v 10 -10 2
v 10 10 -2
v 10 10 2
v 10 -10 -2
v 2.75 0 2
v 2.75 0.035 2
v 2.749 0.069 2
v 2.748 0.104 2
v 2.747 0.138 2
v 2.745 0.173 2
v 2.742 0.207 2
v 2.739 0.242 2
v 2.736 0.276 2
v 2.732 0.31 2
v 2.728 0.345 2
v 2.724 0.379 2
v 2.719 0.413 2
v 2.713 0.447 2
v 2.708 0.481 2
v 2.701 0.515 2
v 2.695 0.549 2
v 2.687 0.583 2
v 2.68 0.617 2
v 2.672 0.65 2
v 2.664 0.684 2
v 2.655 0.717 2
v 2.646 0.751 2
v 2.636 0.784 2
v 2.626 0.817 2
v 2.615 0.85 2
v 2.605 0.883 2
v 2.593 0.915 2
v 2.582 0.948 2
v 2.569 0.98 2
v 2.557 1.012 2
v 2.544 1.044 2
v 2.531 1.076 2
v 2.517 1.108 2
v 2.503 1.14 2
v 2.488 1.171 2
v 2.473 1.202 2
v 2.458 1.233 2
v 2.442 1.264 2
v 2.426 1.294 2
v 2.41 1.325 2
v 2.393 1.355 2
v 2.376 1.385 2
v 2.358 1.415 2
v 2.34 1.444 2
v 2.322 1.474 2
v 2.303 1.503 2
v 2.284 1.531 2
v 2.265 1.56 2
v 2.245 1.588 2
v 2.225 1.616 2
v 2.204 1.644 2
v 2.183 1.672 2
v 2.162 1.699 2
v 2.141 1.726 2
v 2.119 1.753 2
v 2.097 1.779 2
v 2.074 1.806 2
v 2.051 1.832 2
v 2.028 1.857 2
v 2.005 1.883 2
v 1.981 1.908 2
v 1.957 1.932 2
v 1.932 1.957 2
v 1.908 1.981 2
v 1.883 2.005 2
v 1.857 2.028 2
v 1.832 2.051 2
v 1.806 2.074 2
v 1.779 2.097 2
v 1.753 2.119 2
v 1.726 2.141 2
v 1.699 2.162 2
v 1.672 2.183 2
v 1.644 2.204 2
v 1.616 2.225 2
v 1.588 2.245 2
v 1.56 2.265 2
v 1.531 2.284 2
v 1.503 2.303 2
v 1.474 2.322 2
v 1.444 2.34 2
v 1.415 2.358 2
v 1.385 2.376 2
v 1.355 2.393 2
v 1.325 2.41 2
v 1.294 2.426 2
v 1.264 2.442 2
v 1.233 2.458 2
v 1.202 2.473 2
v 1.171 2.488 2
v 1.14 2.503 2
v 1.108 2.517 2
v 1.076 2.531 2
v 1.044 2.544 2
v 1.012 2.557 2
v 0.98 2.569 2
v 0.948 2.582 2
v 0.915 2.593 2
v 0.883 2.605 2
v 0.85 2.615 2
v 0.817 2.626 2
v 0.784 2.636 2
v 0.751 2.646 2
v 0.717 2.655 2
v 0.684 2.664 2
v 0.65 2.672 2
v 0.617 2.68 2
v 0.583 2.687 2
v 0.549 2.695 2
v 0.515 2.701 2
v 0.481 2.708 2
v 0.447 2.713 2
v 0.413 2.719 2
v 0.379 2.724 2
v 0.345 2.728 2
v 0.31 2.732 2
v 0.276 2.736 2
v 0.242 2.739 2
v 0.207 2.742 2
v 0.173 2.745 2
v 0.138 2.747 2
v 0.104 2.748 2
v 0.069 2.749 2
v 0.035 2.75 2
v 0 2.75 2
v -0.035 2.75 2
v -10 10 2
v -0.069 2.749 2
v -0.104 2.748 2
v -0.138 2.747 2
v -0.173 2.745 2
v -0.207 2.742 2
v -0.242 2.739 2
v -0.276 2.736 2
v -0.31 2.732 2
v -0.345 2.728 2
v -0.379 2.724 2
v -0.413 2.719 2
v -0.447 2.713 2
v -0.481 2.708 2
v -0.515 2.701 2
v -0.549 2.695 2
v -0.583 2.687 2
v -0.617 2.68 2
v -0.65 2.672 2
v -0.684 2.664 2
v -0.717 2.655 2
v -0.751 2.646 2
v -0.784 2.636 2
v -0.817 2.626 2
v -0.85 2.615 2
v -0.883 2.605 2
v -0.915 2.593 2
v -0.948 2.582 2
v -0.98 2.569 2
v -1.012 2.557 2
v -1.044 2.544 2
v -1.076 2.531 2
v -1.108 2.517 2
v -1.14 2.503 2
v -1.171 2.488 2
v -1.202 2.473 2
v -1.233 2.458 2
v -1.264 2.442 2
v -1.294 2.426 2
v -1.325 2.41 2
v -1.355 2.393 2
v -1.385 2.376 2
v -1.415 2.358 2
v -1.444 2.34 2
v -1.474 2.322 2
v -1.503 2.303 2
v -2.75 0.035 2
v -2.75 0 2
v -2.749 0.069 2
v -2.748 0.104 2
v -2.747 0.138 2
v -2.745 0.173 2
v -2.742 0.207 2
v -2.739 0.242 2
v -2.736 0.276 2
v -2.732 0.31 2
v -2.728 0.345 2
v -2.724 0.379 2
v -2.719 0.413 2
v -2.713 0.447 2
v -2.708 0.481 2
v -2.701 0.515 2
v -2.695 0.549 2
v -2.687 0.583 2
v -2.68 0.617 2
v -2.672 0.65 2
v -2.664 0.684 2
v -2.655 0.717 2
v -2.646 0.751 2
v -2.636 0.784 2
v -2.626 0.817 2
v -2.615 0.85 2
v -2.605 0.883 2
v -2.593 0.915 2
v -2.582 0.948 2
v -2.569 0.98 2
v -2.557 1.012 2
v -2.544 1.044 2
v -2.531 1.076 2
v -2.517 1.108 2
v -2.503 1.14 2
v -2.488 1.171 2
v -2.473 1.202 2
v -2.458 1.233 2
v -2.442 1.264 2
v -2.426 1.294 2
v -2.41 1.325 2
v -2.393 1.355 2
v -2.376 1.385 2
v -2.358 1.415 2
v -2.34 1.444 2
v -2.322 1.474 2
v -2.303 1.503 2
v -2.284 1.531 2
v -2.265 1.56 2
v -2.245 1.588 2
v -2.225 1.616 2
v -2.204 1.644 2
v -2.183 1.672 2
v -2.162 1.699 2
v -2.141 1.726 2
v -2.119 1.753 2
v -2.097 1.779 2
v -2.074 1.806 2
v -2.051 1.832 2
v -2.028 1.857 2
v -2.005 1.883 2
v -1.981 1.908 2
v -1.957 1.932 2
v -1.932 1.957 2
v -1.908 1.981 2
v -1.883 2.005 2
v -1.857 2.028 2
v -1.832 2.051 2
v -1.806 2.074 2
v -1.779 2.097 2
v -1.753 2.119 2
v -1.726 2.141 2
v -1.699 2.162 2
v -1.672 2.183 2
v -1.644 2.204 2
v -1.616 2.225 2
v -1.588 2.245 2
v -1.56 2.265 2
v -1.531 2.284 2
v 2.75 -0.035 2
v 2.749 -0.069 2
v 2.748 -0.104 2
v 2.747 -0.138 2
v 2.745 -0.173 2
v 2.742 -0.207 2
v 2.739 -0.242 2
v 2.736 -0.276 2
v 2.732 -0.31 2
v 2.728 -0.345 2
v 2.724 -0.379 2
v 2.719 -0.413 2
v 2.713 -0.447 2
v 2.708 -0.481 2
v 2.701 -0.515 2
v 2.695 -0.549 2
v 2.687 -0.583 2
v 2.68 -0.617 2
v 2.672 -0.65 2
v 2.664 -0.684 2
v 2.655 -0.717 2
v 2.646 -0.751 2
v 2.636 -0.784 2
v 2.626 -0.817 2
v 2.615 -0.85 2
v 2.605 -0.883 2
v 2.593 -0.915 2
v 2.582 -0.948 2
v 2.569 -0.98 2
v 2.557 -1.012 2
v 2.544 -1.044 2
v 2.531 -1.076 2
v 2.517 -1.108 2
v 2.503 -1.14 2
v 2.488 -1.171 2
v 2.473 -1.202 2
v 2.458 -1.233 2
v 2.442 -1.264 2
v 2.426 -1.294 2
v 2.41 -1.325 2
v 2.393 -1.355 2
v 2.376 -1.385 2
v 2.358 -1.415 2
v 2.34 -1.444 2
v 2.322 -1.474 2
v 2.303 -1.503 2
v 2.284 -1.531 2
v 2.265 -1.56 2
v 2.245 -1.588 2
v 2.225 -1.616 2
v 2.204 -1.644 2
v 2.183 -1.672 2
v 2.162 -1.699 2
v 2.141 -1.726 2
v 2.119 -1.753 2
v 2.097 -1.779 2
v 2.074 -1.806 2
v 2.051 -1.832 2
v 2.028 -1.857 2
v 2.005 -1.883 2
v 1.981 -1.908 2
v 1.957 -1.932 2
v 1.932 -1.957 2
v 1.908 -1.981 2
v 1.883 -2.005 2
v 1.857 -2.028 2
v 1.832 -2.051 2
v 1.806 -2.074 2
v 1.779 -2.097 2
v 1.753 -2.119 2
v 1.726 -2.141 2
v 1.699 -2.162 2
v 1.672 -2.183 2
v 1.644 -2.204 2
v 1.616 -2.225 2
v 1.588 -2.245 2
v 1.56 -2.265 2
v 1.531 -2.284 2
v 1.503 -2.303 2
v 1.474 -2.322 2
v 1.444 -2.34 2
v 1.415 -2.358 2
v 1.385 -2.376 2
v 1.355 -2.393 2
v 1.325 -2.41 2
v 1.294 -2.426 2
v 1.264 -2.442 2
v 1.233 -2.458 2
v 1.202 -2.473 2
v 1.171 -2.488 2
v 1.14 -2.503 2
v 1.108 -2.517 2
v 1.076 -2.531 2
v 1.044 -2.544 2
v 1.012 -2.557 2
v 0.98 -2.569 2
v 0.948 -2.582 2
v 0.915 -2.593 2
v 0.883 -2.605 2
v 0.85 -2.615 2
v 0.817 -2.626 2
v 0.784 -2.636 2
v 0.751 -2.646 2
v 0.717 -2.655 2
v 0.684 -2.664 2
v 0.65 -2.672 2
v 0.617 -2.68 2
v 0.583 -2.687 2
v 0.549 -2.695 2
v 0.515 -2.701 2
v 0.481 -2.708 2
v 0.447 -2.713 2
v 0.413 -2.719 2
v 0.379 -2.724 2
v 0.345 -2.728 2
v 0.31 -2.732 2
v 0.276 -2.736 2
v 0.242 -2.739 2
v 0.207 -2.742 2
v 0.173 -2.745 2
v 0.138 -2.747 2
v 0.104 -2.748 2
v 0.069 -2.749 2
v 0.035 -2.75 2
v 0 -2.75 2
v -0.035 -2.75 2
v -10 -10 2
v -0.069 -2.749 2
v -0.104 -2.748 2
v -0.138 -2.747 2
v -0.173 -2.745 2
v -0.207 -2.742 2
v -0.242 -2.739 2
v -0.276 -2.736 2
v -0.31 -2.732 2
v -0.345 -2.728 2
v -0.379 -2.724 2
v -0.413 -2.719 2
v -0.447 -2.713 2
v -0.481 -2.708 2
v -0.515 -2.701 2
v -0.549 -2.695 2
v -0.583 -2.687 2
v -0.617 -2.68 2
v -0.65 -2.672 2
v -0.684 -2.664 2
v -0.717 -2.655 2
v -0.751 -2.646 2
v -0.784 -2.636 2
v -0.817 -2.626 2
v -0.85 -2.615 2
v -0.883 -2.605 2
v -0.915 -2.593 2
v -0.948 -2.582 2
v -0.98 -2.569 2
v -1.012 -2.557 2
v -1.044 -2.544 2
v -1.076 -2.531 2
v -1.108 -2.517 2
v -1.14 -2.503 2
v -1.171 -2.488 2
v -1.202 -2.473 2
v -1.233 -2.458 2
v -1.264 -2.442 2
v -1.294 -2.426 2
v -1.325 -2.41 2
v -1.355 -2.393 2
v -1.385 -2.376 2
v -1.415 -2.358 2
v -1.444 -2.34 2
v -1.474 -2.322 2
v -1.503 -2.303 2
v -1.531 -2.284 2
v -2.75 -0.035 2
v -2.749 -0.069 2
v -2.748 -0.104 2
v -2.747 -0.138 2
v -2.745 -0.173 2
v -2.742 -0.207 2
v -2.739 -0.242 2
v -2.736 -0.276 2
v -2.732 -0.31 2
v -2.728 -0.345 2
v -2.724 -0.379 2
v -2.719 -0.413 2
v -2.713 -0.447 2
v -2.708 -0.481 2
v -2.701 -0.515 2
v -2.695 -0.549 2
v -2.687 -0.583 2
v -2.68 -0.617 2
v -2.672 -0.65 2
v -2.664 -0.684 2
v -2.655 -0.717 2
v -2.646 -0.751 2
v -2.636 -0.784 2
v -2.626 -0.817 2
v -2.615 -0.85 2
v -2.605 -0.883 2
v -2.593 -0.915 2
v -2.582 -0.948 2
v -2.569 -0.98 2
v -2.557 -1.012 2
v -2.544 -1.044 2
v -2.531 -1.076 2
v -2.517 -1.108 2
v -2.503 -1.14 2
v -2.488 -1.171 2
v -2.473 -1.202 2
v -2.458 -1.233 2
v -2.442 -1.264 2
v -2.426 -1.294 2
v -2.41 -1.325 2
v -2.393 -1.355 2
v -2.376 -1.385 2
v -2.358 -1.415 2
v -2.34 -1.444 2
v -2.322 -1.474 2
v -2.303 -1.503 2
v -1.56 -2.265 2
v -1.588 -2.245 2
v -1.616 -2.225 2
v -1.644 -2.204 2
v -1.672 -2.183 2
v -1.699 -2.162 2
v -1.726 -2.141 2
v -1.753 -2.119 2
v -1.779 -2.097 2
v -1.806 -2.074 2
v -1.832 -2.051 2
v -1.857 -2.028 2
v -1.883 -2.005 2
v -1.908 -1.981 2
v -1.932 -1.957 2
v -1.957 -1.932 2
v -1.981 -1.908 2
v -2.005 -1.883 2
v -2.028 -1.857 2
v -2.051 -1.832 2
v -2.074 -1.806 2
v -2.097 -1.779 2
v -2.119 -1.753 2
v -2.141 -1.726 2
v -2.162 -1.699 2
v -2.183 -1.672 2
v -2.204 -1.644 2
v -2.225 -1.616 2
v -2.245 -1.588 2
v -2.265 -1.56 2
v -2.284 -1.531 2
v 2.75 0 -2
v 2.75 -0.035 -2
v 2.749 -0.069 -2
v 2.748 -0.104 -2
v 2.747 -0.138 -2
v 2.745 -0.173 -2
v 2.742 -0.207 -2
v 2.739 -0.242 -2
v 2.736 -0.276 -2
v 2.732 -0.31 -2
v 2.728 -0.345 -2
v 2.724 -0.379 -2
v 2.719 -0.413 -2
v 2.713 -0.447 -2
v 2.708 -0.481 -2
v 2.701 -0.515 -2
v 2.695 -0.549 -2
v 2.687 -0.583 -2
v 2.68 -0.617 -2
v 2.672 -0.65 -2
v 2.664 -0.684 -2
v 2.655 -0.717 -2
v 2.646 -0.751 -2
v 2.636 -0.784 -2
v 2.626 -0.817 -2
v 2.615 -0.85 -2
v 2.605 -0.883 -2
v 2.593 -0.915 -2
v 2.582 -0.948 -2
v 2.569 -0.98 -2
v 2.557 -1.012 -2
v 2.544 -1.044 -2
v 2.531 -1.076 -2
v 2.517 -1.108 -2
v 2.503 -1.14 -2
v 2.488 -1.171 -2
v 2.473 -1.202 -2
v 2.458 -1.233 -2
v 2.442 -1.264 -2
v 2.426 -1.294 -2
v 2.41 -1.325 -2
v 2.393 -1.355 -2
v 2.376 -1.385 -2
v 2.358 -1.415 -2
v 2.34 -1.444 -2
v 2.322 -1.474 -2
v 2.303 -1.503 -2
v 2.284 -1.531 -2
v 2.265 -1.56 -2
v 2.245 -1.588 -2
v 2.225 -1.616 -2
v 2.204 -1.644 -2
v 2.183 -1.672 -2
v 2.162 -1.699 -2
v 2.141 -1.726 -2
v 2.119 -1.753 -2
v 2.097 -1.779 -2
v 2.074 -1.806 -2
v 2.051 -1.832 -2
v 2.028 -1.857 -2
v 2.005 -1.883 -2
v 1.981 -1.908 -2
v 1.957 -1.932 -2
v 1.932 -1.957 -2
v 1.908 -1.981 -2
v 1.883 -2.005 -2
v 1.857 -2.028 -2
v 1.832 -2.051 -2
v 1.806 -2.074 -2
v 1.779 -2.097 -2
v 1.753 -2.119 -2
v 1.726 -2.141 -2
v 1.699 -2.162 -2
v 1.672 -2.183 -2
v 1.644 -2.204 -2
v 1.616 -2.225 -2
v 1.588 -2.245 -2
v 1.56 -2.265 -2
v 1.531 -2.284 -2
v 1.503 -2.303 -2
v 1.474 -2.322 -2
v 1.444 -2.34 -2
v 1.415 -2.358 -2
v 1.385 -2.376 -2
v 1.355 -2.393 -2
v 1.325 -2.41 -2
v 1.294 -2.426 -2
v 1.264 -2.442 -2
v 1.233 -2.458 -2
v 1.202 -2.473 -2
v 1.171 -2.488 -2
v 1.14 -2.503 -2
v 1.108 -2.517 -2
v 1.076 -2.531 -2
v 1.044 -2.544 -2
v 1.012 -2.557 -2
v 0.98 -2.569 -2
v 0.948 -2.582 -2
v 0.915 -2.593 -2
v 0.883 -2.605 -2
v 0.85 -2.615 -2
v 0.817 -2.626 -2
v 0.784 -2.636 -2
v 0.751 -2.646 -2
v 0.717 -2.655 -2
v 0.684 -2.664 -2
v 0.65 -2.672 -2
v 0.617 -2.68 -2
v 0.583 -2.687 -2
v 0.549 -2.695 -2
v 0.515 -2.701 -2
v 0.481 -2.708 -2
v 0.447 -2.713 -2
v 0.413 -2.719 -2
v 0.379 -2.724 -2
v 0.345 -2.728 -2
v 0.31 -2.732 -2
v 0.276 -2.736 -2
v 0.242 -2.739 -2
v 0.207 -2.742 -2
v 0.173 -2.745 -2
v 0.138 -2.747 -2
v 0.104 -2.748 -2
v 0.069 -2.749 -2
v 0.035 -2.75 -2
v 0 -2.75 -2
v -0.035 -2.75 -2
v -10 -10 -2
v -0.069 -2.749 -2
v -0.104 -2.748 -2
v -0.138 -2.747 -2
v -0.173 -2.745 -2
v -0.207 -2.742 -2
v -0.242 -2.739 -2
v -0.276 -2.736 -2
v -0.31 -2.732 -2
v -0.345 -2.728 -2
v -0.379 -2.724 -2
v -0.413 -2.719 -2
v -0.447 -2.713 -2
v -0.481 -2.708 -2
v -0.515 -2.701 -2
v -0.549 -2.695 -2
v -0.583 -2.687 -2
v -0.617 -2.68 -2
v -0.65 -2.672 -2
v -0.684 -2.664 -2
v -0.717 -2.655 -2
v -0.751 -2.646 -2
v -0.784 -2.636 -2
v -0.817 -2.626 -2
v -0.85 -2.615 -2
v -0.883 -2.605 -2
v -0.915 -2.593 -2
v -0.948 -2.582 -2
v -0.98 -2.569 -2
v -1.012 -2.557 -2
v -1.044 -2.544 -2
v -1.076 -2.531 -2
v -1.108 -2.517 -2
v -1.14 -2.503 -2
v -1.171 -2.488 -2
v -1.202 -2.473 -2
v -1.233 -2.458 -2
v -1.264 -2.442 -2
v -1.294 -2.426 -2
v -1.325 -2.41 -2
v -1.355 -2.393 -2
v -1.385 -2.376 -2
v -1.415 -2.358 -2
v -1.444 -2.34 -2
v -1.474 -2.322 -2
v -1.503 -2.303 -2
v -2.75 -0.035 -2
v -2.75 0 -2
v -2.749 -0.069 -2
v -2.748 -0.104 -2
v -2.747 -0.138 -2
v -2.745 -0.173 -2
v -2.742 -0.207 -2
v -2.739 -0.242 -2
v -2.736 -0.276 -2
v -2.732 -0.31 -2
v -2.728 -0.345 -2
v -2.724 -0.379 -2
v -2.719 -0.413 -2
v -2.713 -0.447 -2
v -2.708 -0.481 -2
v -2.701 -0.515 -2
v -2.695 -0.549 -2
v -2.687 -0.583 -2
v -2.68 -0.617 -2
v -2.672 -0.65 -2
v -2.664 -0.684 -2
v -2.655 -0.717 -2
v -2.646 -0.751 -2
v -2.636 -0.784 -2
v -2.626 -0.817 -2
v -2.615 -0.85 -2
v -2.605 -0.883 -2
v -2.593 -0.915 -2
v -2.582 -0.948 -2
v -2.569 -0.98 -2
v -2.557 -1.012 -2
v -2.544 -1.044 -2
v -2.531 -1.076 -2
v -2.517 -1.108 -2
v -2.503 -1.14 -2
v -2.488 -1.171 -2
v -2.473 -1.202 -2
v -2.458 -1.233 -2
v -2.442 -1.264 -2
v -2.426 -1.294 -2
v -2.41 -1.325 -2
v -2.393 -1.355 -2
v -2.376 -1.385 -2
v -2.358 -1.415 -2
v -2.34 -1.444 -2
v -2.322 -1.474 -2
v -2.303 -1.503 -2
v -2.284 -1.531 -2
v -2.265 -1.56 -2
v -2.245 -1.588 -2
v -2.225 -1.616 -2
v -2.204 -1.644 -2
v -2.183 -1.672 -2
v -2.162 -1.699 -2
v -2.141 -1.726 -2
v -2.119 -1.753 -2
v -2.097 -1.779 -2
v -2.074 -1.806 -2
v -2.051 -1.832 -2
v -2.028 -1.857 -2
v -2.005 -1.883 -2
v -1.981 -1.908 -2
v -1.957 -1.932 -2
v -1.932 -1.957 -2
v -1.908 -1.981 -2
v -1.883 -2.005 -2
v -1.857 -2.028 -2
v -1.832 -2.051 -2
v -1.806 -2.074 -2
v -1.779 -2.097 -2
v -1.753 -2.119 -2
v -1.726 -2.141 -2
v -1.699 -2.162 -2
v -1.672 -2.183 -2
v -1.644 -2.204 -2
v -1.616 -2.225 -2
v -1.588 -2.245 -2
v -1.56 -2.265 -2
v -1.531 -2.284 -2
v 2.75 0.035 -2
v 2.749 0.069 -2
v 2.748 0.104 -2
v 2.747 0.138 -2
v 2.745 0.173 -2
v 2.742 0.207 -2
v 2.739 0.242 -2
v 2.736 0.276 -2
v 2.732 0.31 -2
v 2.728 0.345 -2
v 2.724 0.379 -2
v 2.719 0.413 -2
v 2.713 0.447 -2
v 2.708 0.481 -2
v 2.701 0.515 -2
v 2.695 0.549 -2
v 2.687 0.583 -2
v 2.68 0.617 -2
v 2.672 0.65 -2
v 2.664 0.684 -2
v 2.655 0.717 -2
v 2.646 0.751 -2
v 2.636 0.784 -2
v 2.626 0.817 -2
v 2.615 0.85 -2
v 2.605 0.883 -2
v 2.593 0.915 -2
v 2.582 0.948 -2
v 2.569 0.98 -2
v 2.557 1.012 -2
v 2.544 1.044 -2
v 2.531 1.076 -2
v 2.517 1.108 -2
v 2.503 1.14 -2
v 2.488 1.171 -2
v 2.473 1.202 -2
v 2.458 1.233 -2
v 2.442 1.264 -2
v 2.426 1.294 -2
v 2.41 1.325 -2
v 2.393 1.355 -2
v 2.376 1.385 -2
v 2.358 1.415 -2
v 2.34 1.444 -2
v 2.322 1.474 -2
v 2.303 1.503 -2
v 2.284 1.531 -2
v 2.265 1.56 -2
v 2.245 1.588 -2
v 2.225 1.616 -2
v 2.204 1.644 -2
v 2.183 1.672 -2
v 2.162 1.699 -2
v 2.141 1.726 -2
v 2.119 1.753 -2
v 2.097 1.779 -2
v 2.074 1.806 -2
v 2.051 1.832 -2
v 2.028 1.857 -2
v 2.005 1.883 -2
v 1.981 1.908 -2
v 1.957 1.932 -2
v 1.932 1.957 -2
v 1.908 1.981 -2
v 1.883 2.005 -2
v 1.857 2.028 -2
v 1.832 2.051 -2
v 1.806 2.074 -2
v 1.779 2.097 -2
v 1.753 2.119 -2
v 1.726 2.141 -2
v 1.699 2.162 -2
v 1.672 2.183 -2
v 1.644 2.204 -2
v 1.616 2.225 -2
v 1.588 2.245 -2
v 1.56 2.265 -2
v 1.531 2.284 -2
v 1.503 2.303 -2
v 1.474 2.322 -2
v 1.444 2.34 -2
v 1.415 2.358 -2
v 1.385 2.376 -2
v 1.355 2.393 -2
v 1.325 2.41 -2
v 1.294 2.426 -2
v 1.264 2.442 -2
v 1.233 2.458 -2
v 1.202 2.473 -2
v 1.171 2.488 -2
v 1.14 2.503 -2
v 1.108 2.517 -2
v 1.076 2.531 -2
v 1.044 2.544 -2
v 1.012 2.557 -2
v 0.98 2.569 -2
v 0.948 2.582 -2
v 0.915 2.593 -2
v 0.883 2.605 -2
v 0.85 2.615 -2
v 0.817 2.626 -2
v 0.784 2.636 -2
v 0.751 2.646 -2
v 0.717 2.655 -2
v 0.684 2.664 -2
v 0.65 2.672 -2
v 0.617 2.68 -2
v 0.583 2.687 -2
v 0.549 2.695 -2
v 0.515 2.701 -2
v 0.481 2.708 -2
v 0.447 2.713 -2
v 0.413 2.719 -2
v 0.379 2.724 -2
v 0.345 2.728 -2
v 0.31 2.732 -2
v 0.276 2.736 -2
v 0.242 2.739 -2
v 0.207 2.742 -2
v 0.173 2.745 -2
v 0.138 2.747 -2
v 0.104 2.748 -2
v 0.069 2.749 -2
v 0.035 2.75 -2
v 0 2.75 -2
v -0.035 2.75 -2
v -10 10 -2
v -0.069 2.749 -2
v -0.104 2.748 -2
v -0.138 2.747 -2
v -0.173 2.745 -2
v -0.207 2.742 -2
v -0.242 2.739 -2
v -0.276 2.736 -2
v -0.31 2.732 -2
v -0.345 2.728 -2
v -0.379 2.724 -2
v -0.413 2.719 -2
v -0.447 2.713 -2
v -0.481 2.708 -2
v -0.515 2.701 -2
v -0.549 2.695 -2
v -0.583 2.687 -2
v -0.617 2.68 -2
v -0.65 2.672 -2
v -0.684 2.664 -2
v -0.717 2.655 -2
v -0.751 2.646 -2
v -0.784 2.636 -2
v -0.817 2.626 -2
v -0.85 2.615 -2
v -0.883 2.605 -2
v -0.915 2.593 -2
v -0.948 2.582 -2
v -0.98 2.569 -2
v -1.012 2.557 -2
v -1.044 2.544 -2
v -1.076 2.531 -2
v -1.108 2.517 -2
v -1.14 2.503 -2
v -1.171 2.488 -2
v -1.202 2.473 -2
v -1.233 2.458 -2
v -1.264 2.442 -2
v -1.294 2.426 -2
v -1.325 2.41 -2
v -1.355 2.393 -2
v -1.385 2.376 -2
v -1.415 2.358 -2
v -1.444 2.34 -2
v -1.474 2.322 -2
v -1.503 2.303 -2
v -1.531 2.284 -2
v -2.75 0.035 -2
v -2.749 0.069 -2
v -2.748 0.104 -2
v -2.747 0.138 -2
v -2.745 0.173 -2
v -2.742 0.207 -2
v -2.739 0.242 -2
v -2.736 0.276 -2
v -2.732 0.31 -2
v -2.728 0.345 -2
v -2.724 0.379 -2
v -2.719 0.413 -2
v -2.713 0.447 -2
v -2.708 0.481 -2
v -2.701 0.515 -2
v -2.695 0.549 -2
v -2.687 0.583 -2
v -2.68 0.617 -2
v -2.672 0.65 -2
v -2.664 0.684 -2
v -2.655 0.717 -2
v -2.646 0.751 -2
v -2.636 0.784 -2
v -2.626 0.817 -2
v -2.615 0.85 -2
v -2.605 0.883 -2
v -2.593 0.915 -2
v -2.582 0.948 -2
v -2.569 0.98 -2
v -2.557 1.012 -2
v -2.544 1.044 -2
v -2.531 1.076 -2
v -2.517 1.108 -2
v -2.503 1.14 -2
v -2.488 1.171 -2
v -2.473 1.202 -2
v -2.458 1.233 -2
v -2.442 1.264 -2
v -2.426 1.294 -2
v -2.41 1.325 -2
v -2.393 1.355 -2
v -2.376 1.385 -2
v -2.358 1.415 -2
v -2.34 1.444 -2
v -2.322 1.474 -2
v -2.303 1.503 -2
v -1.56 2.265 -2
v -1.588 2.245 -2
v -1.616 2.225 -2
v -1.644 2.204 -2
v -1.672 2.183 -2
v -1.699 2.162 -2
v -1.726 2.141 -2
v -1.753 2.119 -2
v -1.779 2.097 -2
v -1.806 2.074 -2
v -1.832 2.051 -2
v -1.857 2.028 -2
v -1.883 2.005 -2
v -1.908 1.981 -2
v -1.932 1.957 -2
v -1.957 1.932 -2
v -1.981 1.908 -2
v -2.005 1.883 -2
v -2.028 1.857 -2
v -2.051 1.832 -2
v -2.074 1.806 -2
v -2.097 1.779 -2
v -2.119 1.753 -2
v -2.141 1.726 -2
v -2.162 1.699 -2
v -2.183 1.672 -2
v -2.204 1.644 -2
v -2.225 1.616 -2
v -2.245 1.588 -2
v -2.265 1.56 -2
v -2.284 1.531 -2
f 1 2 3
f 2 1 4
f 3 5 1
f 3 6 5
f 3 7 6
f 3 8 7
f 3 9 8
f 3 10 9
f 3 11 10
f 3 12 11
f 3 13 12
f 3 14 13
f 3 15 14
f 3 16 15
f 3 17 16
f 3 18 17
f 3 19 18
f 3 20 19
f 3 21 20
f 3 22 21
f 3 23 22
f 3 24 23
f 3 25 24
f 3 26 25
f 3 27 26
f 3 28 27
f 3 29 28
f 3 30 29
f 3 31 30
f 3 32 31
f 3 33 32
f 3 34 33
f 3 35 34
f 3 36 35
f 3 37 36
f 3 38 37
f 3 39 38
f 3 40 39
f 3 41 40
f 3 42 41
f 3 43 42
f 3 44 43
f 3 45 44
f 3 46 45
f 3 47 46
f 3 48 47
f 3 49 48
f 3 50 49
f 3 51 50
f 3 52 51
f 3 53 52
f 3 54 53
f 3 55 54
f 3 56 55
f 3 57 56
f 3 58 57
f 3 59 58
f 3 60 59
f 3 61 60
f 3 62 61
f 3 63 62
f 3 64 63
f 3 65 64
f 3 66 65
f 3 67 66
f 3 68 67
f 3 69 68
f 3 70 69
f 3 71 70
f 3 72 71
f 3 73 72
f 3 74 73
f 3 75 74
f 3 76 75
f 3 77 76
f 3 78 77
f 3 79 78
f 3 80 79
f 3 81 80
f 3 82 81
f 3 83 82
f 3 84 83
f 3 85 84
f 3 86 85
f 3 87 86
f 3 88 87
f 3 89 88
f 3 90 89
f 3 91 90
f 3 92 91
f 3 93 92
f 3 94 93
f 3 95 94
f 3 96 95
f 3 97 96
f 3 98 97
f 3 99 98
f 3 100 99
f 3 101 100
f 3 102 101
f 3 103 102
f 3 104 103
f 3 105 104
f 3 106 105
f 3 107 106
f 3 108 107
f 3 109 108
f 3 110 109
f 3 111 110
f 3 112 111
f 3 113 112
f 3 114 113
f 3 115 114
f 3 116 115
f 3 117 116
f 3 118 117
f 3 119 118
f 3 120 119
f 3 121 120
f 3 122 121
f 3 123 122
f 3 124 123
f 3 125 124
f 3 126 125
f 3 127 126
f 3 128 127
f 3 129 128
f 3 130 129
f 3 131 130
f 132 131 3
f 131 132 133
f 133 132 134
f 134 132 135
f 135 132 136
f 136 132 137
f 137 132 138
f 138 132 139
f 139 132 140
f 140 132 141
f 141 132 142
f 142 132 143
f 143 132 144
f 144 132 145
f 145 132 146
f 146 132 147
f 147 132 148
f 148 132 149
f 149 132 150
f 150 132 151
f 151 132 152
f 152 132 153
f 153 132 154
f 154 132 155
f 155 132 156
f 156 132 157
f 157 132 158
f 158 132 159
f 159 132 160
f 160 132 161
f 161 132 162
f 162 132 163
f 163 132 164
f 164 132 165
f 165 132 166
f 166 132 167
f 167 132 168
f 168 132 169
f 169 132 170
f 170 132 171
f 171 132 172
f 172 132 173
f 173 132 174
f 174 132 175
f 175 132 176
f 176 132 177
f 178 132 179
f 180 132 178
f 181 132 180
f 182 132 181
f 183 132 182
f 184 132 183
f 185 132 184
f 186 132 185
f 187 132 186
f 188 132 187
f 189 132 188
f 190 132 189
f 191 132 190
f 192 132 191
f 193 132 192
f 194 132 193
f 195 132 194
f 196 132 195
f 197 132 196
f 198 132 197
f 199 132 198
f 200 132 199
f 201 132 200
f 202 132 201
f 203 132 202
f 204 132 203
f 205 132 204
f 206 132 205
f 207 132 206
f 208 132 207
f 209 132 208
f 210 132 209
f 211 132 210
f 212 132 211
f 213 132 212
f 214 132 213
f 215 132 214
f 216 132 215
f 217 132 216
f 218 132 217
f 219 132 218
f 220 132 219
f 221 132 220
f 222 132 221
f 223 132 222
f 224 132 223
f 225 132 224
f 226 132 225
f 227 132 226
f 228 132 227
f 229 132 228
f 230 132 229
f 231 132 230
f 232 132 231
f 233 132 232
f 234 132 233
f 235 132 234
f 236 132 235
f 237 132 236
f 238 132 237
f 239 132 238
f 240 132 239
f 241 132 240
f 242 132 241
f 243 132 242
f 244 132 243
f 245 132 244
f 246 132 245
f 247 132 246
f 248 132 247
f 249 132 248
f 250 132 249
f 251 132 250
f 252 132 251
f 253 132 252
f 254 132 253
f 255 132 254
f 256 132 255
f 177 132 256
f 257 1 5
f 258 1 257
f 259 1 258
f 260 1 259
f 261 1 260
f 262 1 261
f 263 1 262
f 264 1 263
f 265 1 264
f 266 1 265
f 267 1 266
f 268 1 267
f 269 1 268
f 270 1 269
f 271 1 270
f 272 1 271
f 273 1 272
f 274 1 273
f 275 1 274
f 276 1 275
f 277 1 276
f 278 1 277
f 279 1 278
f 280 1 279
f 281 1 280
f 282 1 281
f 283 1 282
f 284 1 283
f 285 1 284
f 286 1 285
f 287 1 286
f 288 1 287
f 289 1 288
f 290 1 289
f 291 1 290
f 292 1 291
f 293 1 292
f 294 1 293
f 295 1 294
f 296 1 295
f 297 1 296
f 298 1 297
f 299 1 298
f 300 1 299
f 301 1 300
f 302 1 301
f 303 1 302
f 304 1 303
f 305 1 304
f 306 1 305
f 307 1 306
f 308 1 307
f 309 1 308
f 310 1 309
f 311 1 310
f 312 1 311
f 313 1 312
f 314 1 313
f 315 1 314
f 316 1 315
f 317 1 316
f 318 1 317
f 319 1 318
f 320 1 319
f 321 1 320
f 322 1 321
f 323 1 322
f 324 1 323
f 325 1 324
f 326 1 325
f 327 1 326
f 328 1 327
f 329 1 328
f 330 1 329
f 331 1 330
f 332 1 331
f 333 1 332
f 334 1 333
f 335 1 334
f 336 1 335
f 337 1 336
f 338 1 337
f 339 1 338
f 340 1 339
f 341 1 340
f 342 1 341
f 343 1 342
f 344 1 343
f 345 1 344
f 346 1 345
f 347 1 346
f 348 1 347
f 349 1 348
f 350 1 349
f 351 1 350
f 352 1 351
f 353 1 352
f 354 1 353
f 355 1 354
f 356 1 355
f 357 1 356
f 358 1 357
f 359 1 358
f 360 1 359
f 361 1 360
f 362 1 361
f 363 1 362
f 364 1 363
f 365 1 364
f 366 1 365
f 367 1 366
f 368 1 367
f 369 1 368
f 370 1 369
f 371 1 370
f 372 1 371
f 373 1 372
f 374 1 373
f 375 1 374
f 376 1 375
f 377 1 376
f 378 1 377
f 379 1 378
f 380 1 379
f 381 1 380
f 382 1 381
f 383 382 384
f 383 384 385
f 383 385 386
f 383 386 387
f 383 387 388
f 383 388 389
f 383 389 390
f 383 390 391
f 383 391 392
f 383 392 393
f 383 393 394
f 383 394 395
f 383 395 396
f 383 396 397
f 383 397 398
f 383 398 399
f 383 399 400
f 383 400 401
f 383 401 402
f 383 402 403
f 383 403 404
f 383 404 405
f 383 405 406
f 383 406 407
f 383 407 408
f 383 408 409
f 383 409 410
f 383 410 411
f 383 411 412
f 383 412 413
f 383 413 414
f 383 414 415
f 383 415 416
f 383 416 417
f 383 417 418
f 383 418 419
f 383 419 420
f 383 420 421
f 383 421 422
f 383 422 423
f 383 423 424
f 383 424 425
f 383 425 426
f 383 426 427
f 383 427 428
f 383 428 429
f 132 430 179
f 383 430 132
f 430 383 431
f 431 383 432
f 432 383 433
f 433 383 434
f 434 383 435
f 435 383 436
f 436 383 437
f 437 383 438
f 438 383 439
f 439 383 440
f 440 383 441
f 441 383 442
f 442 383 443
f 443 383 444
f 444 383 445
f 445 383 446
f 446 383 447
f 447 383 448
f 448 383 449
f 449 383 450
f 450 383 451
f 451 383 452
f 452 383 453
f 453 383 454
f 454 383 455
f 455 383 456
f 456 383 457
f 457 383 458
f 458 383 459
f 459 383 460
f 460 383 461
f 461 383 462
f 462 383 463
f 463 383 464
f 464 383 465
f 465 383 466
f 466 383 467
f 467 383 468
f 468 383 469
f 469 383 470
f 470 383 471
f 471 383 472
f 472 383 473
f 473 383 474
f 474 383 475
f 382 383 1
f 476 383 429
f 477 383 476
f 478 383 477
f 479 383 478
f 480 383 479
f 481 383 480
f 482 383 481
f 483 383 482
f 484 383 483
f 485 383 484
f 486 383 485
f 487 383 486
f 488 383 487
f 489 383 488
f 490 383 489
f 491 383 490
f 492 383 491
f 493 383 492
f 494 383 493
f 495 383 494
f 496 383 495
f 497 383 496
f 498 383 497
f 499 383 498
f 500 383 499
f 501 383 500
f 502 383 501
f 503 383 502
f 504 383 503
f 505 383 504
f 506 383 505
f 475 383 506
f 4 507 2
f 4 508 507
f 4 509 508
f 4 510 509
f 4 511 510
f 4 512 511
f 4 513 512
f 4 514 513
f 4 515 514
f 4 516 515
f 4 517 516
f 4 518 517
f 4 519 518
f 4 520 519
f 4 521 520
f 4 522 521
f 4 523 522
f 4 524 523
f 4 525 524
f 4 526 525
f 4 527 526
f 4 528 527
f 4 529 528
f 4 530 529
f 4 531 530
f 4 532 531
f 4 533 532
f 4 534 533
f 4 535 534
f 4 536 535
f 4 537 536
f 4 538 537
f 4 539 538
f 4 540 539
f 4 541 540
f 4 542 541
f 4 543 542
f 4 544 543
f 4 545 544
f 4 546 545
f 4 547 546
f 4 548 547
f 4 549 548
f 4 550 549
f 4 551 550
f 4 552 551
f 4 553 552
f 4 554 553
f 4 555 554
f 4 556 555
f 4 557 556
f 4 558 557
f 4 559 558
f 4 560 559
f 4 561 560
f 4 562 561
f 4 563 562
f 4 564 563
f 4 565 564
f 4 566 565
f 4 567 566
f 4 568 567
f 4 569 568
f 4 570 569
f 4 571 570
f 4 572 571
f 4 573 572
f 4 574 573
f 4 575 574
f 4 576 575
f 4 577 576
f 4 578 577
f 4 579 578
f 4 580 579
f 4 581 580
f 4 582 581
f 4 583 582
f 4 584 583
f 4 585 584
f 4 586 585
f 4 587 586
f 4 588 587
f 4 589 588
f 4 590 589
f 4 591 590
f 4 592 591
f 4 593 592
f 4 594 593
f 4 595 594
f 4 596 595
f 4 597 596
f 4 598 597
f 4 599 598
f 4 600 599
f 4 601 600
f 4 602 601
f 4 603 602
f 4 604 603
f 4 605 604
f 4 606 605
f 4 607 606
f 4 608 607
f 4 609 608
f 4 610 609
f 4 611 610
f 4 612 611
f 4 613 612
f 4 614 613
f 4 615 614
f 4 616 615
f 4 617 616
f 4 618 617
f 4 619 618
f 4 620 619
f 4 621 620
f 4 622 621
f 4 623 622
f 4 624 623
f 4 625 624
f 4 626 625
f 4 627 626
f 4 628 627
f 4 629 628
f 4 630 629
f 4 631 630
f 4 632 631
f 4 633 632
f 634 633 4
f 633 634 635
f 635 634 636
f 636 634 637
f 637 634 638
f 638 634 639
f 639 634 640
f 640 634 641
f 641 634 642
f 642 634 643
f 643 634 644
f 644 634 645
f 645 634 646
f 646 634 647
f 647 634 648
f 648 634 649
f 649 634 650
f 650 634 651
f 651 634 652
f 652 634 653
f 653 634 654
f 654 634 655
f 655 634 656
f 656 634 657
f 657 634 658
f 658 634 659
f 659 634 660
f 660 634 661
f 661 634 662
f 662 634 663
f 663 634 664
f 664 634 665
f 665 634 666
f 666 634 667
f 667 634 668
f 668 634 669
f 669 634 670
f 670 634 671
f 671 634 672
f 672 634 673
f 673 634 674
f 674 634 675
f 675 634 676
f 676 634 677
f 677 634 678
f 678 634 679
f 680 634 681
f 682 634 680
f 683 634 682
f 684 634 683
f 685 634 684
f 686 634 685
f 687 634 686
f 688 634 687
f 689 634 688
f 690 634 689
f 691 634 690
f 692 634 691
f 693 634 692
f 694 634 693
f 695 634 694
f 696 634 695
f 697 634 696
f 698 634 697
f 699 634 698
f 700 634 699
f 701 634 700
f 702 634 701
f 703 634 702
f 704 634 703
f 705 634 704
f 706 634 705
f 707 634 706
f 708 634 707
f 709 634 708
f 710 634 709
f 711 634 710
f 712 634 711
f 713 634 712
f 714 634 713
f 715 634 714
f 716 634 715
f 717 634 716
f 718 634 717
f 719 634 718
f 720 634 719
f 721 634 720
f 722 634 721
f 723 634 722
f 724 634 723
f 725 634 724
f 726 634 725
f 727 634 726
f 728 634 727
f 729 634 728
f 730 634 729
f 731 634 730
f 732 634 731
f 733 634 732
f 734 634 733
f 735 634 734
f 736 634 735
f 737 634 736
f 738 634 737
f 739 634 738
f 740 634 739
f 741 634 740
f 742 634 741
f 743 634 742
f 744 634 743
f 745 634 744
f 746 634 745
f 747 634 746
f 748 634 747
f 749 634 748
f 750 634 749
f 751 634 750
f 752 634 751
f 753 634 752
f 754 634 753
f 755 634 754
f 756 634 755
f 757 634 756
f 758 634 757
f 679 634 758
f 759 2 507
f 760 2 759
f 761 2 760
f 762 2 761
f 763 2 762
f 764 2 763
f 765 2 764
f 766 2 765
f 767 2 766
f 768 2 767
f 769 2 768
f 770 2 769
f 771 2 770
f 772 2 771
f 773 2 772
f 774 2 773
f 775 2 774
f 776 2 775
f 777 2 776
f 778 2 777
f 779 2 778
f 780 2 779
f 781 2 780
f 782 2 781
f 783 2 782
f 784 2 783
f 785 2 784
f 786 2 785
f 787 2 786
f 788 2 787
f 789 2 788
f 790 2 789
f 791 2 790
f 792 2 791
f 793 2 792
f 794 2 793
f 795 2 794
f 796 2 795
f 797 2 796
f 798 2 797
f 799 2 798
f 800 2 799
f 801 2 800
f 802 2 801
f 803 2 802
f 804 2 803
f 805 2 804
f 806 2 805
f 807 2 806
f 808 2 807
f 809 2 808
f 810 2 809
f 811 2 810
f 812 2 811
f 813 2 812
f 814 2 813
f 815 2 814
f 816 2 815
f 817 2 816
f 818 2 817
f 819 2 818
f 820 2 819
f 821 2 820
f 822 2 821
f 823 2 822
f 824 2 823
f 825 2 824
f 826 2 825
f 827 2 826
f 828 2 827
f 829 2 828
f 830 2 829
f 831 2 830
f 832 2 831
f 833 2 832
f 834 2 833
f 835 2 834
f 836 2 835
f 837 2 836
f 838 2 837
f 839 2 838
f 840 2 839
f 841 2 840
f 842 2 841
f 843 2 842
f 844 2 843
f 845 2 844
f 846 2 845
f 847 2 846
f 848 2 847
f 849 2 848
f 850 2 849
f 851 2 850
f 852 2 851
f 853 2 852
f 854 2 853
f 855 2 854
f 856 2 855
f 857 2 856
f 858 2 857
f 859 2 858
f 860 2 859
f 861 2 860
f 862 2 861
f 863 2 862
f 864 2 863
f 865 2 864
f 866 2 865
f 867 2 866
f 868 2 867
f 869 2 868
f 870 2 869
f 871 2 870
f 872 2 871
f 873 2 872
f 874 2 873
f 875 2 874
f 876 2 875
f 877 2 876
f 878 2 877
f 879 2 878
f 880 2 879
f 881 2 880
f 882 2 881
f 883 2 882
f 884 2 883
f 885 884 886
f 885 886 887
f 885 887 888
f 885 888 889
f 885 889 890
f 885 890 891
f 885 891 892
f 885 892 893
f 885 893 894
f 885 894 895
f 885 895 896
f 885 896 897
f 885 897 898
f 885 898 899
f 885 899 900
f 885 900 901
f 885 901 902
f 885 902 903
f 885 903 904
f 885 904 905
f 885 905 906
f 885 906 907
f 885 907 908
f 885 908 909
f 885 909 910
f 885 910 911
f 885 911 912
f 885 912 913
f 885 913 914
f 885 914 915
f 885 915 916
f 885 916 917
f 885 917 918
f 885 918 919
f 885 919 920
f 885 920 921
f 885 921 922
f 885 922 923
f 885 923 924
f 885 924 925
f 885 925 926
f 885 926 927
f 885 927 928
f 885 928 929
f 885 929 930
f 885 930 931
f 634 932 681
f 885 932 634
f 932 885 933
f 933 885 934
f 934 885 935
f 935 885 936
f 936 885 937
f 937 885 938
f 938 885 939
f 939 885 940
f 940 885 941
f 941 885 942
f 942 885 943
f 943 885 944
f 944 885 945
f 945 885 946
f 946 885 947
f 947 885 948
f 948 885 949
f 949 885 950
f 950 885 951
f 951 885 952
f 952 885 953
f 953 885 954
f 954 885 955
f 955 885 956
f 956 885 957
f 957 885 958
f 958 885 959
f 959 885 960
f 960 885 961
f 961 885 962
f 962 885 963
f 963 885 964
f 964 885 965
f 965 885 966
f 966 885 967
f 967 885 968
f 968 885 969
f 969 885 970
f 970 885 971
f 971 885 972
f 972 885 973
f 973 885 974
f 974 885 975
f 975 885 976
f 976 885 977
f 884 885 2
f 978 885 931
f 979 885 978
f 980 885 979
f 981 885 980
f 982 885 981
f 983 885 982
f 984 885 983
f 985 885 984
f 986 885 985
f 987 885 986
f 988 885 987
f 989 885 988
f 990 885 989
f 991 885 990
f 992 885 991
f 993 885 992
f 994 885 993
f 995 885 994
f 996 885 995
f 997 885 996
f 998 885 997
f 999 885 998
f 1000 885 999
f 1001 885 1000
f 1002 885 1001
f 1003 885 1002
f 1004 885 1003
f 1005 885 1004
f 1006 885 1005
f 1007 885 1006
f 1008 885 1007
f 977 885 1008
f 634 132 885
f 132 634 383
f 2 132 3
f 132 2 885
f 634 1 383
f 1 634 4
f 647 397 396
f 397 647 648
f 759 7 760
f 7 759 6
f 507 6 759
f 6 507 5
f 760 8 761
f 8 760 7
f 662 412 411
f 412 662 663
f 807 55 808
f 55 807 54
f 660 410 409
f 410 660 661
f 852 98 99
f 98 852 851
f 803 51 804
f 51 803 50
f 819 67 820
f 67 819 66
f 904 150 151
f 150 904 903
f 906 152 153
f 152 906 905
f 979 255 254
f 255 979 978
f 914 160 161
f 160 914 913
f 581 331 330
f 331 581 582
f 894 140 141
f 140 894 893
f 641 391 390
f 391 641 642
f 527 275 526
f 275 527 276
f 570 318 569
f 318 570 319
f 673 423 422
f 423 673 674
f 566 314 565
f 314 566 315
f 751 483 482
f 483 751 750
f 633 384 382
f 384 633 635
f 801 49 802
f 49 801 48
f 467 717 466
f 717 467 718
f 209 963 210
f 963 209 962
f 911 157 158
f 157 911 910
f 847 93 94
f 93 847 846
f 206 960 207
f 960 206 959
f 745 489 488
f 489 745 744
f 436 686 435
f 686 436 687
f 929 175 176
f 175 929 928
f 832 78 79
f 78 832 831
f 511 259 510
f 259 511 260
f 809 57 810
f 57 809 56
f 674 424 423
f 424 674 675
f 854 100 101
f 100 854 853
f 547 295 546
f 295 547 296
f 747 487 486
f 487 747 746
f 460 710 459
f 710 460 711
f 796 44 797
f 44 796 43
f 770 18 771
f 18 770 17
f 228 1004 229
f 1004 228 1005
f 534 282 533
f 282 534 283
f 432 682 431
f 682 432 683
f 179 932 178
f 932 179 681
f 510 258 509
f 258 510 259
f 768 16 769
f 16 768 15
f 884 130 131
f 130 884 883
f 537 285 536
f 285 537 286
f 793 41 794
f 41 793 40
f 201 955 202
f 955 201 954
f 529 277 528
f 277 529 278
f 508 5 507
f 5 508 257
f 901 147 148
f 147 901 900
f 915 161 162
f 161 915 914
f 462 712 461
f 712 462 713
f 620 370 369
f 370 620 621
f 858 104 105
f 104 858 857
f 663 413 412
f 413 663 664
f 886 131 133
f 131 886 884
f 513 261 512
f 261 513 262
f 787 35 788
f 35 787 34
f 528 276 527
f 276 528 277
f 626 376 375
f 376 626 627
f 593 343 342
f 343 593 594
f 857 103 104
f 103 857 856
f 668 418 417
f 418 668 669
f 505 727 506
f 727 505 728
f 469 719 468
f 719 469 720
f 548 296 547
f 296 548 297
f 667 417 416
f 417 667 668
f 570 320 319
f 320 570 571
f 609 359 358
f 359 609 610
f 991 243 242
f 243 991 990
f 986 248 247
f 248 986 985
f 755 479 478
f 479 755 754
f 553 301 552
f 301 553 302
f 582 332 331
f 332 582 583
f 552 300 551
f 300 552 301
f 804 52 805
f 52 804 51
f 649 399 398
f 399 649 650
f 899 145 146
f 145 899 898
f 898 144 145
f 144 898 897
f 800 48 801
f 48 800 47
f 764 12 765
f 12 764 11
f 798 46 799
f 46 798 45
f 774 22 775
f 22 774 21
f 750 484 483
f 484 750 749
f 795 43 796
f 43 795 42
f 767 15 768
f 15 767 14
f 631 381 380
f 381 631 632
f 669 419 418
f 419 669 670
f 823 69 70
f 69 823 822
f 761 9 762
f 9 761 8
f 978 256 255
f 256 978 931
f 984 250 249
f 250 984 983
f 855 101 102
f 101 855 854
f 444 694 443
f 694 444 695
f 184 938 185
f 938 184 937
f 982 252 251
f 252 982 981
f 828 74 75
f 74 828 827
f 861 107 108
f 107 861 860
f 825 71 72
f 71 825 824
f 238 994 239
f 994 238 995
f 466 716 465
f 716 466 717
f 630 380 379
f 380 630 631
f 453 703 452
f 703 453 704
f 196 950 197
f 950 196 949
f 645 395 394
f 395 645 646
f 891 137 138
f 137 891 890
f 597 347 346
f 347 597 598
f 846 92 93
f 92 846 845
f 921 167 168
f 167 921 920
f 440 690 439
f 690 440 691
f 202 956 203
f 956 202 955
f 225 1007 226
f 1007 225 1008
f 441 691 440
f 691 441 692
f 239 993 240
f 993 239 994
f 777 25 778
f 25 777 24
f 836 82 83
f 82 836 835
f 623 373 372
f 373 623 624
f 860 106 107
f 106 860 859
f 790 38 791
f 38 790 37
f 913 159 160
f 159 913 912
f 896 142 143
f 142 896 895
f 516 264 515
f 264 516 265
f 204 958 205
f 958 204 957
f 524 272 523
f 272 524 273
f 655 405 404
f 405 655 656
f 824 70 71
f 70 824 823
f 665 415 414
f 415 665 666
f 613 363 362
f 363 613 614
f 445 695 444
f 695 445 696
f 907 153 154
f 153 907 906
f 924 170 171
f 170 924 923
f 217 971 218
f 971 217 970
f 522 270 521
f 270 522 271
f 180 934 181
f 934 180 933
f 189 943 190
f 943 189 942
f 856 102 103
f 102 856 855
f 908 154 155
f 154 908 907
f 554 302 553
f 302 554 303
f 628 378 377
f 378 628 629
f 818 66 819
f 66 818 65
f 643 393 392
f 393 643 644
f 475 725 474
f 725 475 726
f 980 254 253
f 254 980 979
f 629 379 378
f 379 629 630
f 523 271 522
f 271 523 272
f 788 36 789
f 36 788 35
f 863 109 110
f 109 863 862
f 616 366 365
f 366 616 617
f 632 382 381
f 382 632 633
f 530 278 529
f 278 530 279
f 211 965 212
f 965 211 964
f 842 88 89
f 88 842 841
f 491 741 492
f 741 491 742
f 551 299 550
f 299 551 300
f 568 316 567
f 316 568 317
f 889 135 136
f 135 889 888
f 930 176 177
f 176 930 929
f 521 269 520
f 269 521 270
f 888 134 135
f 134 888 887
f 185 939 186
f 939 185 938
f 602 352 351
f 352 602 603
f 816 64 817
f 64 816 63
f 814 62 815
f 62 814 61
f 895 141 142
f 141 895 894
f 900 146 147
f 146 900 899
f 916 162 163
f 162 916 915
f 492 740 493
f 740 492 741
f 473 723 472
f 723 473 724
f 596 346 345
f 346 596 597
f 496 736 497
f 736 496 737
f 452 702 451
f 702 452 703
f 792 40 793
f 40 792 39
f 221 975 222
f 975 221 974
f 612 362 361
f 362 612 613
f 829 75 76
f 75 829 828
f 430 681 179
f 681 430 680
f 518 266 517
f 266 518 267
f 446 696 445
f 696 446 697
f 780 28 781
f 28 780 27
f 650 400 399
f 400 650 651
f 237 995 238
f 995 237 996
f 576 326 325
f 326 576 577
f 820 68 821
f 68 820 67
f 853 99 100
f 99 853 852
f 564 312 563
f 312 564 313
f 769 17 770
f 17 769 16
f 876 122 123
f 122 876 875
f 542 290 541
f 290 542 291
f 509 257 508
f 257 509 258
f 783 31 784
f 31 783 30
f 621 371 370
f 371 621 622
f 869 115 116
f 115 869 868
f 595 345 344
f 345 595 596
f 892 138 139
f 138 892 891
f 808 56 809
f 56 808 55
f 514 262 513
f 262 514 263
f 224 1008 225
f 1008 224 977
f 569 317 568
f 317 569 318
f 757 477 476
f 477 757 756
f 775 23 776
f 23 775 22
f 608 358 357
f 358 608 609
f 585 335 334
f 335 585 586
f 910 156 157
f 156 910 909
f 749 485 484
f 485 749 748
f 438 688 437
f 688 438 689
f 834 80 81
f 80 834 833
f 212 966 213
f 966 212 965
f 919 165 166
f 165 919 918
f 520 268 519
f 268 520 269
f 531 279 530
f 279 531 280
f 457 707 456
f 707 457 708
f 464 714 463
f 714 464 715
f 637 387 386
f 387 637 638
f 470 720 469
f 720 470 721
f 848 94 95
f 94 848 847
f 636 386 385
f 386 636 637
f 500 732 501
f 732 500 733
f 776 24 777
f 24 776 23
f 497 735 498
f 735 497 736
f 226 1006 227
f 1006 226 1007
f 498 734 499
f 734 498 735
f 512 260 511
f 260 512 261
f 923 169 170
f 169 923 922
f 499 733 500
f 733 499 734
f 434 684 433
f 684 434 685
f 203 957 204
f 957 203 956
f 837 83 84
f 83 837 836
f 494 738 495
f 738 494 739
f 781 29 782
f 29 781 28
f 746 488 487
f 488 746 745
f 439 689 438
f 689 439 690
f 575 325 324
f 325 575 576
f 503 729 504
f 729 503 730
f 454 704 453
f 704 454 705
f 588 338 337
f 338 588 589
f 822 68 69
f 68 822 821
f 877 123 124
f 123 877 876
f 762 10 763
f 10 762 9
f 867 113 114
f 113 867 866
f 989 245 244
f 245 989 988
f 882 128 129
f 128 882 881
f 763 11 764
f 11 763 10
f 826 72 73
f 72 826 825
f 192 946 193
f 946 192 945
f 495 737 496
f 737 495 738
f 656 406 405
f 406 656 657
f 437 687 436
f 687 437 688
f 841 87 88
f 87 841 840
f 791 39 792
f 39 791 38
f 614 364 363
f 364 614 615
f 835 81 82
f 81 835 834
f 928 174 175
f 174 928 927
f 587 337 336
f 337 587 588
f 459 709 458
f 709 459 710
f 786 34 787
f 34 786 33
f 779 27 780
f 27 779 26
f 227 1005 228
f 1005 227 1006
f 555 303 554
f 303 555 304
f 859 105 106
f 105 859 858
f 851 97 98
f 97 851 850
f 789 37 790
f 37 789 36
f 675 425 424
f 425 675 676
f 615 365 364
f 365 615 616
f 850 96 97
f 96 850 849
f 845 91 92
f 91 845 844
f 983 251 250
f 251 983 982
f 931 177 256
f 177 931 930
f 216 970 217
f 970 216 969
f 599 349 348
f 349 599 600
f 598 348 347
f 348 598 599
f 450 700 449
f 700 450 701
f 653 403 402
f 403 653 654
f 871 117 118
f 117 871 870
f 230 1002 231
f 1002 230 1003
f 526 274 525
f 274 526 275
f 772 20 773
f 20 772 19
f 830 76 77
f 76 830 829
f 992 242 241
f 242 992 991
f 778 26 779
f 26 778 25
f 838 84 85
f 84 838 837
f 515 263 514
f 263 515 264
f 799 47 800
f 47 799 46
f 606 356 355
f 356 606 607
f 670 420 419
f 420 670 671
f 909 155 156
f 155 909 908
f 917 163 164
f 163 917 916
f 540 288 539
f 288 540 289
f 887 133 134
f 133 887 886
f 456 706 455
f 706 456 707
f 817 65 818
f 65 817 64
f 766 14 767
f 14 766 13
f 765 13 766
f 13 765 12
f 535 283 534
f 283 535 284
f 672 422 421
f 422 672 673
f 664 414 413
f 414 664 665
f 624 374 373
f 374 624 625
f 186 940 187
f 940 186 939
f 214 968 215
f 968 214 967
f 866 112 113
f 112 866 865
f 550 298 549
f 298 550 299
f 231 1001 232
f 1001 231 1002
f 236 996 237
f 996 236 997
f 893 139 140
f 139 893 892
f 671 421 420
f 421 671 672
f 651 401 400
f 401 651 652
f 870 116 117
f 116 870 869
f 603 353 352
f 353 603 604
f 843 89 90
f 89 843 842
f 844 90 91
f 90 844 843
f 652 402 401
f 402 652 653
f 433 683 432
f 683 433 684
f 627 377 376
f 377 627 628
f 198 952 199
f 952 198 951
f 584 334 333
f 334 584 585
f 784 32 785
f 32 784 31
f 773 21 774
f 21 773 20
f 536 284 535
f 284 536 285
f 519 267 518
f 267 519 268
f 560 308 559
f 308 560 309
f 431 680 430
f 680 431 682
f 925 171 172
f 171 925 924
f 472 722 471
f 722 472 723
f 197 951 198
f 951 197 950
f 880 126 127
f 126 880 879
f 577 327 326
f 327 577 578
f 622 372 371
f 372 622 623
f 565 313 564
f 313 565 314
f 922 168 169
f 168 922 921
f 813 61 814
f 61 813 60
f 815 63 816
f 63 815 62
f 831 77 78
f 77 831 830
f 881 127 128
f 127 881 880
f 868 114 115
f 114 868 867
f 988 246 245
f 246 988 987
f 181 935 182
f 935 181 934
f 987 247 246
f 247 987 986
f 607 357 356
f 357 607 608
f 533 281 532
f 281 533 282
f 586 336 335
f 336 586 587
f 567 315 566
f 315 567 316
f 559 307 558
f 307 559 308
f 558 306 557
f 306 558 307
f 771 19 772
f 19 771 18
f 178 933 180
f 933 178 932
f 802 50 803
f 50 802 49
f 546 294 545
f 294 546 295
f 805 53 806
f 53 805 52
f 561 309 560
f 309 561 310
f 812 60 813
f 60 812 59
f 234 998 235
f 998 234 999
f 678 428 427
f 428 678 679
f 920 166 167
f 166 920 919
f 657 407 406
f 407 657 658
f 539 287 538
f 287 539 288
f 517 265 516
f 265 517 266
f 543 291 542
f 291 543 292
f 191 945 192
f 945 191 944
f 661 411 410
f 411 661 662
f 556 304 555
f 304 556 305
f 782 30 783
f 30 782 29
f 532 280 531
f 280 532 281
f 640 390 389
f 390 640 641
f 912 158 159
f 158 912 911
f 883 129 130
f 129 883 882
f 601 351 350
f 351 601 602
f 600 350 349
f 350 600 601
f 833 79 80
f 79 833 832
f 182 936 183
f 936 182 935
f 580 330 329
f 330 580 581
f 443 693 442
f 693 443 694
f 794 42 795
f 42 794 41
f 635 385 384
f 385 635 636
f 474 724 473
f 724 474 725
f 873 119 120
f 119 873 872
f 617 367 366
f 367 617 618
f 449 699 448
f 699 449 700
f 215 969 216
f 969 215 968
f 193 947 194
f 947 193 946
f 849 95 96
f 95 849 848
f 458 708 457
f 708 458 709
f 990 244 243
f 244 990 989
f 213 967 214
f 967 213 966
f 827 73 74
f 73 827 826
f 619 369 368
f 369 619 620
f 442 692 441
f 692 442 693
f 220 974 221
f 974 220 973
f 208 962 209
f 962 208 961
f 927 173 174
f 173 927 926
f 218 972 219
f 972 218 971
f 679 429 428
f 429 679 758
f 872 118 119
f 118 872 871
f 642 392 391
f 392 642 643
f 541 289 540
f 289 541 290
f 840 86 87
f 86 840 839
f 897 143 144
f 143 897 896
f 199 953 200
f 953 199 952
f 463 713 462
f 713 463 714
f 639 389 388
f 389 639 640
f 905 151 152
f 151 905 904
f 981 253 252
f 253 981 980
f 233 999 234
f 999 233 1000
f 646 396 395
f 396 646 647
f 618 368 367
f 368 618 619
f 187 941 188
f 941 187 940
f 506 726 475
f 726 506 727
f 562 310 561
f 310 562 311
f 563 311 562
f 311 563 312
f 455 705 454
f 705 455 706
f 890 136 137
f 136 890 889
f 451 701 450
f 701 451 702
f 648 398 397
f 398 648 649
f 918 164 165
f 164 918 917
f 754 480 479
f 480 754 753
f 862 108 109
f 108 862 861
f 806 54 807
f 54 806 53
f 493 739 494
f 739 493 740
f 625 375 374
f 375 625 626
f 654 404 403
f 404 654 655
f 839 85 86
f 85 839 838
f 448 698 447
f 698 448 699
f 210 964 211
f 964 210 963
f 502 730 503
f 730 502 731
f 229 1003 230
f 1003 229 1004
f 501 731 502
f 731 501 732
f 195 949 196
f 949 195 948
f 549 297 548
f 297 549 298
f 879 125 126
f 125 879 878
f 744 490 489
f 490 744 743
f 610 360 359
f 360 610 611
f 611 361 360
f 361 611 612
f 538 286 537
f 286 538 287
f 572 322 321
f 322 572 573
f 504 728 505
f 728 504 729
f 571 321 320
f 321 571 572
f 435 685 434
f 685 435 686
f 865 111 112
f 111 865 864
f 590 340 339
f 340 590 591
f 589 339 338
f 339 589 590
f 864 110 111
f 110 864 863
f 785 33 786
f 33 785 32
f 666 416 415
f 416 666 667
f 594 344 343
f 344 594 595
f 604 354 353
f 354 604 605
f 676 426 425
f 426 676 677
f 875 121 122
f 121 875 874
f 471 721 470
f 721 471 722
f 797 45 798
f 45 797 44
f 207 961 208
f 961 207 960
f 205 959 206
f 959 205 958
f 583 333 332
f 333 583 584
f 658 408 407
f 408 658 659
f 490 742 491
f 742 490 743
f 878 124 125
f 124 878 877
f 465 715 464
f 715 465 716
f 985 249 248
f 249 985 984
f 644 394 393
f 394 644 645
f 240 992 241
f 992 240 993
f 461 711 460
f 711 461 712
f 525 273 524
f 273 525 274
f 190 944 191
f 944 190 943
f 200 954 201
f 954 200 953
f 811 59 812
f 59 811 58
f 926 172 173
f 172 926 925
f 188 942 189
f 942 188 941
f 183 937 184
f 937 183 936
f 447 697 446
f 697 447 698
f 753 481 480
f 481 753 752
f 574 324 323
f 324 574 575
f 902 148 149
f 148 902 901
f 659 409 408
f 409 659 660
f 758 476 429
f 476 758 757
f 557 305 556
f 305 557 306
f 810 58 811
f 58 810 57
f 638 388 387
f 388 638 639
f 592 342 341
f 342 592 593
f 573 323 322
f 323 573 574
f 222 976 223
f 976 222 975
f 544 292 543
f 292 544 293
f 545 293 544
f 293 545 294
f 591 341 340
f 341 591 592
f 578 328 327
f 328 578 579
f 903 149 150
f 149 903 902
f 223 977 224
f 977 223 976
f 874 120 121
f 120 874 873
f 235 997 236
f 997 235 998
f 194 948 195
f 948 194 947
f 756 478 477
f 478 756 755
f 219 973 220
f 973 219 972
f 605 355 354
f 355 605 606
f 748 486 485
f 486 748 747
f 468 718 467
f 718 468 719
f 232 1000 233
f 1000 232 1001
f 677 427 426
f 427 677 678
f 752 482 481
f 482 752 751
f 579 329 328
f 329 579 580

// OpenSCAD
$fn=500;
$holeSize=5.5;

difference()
{
#cube([20,20,4], center=true);
translate([0,0,-4]) #cylinder(d=$holeSize,h=8);
}
